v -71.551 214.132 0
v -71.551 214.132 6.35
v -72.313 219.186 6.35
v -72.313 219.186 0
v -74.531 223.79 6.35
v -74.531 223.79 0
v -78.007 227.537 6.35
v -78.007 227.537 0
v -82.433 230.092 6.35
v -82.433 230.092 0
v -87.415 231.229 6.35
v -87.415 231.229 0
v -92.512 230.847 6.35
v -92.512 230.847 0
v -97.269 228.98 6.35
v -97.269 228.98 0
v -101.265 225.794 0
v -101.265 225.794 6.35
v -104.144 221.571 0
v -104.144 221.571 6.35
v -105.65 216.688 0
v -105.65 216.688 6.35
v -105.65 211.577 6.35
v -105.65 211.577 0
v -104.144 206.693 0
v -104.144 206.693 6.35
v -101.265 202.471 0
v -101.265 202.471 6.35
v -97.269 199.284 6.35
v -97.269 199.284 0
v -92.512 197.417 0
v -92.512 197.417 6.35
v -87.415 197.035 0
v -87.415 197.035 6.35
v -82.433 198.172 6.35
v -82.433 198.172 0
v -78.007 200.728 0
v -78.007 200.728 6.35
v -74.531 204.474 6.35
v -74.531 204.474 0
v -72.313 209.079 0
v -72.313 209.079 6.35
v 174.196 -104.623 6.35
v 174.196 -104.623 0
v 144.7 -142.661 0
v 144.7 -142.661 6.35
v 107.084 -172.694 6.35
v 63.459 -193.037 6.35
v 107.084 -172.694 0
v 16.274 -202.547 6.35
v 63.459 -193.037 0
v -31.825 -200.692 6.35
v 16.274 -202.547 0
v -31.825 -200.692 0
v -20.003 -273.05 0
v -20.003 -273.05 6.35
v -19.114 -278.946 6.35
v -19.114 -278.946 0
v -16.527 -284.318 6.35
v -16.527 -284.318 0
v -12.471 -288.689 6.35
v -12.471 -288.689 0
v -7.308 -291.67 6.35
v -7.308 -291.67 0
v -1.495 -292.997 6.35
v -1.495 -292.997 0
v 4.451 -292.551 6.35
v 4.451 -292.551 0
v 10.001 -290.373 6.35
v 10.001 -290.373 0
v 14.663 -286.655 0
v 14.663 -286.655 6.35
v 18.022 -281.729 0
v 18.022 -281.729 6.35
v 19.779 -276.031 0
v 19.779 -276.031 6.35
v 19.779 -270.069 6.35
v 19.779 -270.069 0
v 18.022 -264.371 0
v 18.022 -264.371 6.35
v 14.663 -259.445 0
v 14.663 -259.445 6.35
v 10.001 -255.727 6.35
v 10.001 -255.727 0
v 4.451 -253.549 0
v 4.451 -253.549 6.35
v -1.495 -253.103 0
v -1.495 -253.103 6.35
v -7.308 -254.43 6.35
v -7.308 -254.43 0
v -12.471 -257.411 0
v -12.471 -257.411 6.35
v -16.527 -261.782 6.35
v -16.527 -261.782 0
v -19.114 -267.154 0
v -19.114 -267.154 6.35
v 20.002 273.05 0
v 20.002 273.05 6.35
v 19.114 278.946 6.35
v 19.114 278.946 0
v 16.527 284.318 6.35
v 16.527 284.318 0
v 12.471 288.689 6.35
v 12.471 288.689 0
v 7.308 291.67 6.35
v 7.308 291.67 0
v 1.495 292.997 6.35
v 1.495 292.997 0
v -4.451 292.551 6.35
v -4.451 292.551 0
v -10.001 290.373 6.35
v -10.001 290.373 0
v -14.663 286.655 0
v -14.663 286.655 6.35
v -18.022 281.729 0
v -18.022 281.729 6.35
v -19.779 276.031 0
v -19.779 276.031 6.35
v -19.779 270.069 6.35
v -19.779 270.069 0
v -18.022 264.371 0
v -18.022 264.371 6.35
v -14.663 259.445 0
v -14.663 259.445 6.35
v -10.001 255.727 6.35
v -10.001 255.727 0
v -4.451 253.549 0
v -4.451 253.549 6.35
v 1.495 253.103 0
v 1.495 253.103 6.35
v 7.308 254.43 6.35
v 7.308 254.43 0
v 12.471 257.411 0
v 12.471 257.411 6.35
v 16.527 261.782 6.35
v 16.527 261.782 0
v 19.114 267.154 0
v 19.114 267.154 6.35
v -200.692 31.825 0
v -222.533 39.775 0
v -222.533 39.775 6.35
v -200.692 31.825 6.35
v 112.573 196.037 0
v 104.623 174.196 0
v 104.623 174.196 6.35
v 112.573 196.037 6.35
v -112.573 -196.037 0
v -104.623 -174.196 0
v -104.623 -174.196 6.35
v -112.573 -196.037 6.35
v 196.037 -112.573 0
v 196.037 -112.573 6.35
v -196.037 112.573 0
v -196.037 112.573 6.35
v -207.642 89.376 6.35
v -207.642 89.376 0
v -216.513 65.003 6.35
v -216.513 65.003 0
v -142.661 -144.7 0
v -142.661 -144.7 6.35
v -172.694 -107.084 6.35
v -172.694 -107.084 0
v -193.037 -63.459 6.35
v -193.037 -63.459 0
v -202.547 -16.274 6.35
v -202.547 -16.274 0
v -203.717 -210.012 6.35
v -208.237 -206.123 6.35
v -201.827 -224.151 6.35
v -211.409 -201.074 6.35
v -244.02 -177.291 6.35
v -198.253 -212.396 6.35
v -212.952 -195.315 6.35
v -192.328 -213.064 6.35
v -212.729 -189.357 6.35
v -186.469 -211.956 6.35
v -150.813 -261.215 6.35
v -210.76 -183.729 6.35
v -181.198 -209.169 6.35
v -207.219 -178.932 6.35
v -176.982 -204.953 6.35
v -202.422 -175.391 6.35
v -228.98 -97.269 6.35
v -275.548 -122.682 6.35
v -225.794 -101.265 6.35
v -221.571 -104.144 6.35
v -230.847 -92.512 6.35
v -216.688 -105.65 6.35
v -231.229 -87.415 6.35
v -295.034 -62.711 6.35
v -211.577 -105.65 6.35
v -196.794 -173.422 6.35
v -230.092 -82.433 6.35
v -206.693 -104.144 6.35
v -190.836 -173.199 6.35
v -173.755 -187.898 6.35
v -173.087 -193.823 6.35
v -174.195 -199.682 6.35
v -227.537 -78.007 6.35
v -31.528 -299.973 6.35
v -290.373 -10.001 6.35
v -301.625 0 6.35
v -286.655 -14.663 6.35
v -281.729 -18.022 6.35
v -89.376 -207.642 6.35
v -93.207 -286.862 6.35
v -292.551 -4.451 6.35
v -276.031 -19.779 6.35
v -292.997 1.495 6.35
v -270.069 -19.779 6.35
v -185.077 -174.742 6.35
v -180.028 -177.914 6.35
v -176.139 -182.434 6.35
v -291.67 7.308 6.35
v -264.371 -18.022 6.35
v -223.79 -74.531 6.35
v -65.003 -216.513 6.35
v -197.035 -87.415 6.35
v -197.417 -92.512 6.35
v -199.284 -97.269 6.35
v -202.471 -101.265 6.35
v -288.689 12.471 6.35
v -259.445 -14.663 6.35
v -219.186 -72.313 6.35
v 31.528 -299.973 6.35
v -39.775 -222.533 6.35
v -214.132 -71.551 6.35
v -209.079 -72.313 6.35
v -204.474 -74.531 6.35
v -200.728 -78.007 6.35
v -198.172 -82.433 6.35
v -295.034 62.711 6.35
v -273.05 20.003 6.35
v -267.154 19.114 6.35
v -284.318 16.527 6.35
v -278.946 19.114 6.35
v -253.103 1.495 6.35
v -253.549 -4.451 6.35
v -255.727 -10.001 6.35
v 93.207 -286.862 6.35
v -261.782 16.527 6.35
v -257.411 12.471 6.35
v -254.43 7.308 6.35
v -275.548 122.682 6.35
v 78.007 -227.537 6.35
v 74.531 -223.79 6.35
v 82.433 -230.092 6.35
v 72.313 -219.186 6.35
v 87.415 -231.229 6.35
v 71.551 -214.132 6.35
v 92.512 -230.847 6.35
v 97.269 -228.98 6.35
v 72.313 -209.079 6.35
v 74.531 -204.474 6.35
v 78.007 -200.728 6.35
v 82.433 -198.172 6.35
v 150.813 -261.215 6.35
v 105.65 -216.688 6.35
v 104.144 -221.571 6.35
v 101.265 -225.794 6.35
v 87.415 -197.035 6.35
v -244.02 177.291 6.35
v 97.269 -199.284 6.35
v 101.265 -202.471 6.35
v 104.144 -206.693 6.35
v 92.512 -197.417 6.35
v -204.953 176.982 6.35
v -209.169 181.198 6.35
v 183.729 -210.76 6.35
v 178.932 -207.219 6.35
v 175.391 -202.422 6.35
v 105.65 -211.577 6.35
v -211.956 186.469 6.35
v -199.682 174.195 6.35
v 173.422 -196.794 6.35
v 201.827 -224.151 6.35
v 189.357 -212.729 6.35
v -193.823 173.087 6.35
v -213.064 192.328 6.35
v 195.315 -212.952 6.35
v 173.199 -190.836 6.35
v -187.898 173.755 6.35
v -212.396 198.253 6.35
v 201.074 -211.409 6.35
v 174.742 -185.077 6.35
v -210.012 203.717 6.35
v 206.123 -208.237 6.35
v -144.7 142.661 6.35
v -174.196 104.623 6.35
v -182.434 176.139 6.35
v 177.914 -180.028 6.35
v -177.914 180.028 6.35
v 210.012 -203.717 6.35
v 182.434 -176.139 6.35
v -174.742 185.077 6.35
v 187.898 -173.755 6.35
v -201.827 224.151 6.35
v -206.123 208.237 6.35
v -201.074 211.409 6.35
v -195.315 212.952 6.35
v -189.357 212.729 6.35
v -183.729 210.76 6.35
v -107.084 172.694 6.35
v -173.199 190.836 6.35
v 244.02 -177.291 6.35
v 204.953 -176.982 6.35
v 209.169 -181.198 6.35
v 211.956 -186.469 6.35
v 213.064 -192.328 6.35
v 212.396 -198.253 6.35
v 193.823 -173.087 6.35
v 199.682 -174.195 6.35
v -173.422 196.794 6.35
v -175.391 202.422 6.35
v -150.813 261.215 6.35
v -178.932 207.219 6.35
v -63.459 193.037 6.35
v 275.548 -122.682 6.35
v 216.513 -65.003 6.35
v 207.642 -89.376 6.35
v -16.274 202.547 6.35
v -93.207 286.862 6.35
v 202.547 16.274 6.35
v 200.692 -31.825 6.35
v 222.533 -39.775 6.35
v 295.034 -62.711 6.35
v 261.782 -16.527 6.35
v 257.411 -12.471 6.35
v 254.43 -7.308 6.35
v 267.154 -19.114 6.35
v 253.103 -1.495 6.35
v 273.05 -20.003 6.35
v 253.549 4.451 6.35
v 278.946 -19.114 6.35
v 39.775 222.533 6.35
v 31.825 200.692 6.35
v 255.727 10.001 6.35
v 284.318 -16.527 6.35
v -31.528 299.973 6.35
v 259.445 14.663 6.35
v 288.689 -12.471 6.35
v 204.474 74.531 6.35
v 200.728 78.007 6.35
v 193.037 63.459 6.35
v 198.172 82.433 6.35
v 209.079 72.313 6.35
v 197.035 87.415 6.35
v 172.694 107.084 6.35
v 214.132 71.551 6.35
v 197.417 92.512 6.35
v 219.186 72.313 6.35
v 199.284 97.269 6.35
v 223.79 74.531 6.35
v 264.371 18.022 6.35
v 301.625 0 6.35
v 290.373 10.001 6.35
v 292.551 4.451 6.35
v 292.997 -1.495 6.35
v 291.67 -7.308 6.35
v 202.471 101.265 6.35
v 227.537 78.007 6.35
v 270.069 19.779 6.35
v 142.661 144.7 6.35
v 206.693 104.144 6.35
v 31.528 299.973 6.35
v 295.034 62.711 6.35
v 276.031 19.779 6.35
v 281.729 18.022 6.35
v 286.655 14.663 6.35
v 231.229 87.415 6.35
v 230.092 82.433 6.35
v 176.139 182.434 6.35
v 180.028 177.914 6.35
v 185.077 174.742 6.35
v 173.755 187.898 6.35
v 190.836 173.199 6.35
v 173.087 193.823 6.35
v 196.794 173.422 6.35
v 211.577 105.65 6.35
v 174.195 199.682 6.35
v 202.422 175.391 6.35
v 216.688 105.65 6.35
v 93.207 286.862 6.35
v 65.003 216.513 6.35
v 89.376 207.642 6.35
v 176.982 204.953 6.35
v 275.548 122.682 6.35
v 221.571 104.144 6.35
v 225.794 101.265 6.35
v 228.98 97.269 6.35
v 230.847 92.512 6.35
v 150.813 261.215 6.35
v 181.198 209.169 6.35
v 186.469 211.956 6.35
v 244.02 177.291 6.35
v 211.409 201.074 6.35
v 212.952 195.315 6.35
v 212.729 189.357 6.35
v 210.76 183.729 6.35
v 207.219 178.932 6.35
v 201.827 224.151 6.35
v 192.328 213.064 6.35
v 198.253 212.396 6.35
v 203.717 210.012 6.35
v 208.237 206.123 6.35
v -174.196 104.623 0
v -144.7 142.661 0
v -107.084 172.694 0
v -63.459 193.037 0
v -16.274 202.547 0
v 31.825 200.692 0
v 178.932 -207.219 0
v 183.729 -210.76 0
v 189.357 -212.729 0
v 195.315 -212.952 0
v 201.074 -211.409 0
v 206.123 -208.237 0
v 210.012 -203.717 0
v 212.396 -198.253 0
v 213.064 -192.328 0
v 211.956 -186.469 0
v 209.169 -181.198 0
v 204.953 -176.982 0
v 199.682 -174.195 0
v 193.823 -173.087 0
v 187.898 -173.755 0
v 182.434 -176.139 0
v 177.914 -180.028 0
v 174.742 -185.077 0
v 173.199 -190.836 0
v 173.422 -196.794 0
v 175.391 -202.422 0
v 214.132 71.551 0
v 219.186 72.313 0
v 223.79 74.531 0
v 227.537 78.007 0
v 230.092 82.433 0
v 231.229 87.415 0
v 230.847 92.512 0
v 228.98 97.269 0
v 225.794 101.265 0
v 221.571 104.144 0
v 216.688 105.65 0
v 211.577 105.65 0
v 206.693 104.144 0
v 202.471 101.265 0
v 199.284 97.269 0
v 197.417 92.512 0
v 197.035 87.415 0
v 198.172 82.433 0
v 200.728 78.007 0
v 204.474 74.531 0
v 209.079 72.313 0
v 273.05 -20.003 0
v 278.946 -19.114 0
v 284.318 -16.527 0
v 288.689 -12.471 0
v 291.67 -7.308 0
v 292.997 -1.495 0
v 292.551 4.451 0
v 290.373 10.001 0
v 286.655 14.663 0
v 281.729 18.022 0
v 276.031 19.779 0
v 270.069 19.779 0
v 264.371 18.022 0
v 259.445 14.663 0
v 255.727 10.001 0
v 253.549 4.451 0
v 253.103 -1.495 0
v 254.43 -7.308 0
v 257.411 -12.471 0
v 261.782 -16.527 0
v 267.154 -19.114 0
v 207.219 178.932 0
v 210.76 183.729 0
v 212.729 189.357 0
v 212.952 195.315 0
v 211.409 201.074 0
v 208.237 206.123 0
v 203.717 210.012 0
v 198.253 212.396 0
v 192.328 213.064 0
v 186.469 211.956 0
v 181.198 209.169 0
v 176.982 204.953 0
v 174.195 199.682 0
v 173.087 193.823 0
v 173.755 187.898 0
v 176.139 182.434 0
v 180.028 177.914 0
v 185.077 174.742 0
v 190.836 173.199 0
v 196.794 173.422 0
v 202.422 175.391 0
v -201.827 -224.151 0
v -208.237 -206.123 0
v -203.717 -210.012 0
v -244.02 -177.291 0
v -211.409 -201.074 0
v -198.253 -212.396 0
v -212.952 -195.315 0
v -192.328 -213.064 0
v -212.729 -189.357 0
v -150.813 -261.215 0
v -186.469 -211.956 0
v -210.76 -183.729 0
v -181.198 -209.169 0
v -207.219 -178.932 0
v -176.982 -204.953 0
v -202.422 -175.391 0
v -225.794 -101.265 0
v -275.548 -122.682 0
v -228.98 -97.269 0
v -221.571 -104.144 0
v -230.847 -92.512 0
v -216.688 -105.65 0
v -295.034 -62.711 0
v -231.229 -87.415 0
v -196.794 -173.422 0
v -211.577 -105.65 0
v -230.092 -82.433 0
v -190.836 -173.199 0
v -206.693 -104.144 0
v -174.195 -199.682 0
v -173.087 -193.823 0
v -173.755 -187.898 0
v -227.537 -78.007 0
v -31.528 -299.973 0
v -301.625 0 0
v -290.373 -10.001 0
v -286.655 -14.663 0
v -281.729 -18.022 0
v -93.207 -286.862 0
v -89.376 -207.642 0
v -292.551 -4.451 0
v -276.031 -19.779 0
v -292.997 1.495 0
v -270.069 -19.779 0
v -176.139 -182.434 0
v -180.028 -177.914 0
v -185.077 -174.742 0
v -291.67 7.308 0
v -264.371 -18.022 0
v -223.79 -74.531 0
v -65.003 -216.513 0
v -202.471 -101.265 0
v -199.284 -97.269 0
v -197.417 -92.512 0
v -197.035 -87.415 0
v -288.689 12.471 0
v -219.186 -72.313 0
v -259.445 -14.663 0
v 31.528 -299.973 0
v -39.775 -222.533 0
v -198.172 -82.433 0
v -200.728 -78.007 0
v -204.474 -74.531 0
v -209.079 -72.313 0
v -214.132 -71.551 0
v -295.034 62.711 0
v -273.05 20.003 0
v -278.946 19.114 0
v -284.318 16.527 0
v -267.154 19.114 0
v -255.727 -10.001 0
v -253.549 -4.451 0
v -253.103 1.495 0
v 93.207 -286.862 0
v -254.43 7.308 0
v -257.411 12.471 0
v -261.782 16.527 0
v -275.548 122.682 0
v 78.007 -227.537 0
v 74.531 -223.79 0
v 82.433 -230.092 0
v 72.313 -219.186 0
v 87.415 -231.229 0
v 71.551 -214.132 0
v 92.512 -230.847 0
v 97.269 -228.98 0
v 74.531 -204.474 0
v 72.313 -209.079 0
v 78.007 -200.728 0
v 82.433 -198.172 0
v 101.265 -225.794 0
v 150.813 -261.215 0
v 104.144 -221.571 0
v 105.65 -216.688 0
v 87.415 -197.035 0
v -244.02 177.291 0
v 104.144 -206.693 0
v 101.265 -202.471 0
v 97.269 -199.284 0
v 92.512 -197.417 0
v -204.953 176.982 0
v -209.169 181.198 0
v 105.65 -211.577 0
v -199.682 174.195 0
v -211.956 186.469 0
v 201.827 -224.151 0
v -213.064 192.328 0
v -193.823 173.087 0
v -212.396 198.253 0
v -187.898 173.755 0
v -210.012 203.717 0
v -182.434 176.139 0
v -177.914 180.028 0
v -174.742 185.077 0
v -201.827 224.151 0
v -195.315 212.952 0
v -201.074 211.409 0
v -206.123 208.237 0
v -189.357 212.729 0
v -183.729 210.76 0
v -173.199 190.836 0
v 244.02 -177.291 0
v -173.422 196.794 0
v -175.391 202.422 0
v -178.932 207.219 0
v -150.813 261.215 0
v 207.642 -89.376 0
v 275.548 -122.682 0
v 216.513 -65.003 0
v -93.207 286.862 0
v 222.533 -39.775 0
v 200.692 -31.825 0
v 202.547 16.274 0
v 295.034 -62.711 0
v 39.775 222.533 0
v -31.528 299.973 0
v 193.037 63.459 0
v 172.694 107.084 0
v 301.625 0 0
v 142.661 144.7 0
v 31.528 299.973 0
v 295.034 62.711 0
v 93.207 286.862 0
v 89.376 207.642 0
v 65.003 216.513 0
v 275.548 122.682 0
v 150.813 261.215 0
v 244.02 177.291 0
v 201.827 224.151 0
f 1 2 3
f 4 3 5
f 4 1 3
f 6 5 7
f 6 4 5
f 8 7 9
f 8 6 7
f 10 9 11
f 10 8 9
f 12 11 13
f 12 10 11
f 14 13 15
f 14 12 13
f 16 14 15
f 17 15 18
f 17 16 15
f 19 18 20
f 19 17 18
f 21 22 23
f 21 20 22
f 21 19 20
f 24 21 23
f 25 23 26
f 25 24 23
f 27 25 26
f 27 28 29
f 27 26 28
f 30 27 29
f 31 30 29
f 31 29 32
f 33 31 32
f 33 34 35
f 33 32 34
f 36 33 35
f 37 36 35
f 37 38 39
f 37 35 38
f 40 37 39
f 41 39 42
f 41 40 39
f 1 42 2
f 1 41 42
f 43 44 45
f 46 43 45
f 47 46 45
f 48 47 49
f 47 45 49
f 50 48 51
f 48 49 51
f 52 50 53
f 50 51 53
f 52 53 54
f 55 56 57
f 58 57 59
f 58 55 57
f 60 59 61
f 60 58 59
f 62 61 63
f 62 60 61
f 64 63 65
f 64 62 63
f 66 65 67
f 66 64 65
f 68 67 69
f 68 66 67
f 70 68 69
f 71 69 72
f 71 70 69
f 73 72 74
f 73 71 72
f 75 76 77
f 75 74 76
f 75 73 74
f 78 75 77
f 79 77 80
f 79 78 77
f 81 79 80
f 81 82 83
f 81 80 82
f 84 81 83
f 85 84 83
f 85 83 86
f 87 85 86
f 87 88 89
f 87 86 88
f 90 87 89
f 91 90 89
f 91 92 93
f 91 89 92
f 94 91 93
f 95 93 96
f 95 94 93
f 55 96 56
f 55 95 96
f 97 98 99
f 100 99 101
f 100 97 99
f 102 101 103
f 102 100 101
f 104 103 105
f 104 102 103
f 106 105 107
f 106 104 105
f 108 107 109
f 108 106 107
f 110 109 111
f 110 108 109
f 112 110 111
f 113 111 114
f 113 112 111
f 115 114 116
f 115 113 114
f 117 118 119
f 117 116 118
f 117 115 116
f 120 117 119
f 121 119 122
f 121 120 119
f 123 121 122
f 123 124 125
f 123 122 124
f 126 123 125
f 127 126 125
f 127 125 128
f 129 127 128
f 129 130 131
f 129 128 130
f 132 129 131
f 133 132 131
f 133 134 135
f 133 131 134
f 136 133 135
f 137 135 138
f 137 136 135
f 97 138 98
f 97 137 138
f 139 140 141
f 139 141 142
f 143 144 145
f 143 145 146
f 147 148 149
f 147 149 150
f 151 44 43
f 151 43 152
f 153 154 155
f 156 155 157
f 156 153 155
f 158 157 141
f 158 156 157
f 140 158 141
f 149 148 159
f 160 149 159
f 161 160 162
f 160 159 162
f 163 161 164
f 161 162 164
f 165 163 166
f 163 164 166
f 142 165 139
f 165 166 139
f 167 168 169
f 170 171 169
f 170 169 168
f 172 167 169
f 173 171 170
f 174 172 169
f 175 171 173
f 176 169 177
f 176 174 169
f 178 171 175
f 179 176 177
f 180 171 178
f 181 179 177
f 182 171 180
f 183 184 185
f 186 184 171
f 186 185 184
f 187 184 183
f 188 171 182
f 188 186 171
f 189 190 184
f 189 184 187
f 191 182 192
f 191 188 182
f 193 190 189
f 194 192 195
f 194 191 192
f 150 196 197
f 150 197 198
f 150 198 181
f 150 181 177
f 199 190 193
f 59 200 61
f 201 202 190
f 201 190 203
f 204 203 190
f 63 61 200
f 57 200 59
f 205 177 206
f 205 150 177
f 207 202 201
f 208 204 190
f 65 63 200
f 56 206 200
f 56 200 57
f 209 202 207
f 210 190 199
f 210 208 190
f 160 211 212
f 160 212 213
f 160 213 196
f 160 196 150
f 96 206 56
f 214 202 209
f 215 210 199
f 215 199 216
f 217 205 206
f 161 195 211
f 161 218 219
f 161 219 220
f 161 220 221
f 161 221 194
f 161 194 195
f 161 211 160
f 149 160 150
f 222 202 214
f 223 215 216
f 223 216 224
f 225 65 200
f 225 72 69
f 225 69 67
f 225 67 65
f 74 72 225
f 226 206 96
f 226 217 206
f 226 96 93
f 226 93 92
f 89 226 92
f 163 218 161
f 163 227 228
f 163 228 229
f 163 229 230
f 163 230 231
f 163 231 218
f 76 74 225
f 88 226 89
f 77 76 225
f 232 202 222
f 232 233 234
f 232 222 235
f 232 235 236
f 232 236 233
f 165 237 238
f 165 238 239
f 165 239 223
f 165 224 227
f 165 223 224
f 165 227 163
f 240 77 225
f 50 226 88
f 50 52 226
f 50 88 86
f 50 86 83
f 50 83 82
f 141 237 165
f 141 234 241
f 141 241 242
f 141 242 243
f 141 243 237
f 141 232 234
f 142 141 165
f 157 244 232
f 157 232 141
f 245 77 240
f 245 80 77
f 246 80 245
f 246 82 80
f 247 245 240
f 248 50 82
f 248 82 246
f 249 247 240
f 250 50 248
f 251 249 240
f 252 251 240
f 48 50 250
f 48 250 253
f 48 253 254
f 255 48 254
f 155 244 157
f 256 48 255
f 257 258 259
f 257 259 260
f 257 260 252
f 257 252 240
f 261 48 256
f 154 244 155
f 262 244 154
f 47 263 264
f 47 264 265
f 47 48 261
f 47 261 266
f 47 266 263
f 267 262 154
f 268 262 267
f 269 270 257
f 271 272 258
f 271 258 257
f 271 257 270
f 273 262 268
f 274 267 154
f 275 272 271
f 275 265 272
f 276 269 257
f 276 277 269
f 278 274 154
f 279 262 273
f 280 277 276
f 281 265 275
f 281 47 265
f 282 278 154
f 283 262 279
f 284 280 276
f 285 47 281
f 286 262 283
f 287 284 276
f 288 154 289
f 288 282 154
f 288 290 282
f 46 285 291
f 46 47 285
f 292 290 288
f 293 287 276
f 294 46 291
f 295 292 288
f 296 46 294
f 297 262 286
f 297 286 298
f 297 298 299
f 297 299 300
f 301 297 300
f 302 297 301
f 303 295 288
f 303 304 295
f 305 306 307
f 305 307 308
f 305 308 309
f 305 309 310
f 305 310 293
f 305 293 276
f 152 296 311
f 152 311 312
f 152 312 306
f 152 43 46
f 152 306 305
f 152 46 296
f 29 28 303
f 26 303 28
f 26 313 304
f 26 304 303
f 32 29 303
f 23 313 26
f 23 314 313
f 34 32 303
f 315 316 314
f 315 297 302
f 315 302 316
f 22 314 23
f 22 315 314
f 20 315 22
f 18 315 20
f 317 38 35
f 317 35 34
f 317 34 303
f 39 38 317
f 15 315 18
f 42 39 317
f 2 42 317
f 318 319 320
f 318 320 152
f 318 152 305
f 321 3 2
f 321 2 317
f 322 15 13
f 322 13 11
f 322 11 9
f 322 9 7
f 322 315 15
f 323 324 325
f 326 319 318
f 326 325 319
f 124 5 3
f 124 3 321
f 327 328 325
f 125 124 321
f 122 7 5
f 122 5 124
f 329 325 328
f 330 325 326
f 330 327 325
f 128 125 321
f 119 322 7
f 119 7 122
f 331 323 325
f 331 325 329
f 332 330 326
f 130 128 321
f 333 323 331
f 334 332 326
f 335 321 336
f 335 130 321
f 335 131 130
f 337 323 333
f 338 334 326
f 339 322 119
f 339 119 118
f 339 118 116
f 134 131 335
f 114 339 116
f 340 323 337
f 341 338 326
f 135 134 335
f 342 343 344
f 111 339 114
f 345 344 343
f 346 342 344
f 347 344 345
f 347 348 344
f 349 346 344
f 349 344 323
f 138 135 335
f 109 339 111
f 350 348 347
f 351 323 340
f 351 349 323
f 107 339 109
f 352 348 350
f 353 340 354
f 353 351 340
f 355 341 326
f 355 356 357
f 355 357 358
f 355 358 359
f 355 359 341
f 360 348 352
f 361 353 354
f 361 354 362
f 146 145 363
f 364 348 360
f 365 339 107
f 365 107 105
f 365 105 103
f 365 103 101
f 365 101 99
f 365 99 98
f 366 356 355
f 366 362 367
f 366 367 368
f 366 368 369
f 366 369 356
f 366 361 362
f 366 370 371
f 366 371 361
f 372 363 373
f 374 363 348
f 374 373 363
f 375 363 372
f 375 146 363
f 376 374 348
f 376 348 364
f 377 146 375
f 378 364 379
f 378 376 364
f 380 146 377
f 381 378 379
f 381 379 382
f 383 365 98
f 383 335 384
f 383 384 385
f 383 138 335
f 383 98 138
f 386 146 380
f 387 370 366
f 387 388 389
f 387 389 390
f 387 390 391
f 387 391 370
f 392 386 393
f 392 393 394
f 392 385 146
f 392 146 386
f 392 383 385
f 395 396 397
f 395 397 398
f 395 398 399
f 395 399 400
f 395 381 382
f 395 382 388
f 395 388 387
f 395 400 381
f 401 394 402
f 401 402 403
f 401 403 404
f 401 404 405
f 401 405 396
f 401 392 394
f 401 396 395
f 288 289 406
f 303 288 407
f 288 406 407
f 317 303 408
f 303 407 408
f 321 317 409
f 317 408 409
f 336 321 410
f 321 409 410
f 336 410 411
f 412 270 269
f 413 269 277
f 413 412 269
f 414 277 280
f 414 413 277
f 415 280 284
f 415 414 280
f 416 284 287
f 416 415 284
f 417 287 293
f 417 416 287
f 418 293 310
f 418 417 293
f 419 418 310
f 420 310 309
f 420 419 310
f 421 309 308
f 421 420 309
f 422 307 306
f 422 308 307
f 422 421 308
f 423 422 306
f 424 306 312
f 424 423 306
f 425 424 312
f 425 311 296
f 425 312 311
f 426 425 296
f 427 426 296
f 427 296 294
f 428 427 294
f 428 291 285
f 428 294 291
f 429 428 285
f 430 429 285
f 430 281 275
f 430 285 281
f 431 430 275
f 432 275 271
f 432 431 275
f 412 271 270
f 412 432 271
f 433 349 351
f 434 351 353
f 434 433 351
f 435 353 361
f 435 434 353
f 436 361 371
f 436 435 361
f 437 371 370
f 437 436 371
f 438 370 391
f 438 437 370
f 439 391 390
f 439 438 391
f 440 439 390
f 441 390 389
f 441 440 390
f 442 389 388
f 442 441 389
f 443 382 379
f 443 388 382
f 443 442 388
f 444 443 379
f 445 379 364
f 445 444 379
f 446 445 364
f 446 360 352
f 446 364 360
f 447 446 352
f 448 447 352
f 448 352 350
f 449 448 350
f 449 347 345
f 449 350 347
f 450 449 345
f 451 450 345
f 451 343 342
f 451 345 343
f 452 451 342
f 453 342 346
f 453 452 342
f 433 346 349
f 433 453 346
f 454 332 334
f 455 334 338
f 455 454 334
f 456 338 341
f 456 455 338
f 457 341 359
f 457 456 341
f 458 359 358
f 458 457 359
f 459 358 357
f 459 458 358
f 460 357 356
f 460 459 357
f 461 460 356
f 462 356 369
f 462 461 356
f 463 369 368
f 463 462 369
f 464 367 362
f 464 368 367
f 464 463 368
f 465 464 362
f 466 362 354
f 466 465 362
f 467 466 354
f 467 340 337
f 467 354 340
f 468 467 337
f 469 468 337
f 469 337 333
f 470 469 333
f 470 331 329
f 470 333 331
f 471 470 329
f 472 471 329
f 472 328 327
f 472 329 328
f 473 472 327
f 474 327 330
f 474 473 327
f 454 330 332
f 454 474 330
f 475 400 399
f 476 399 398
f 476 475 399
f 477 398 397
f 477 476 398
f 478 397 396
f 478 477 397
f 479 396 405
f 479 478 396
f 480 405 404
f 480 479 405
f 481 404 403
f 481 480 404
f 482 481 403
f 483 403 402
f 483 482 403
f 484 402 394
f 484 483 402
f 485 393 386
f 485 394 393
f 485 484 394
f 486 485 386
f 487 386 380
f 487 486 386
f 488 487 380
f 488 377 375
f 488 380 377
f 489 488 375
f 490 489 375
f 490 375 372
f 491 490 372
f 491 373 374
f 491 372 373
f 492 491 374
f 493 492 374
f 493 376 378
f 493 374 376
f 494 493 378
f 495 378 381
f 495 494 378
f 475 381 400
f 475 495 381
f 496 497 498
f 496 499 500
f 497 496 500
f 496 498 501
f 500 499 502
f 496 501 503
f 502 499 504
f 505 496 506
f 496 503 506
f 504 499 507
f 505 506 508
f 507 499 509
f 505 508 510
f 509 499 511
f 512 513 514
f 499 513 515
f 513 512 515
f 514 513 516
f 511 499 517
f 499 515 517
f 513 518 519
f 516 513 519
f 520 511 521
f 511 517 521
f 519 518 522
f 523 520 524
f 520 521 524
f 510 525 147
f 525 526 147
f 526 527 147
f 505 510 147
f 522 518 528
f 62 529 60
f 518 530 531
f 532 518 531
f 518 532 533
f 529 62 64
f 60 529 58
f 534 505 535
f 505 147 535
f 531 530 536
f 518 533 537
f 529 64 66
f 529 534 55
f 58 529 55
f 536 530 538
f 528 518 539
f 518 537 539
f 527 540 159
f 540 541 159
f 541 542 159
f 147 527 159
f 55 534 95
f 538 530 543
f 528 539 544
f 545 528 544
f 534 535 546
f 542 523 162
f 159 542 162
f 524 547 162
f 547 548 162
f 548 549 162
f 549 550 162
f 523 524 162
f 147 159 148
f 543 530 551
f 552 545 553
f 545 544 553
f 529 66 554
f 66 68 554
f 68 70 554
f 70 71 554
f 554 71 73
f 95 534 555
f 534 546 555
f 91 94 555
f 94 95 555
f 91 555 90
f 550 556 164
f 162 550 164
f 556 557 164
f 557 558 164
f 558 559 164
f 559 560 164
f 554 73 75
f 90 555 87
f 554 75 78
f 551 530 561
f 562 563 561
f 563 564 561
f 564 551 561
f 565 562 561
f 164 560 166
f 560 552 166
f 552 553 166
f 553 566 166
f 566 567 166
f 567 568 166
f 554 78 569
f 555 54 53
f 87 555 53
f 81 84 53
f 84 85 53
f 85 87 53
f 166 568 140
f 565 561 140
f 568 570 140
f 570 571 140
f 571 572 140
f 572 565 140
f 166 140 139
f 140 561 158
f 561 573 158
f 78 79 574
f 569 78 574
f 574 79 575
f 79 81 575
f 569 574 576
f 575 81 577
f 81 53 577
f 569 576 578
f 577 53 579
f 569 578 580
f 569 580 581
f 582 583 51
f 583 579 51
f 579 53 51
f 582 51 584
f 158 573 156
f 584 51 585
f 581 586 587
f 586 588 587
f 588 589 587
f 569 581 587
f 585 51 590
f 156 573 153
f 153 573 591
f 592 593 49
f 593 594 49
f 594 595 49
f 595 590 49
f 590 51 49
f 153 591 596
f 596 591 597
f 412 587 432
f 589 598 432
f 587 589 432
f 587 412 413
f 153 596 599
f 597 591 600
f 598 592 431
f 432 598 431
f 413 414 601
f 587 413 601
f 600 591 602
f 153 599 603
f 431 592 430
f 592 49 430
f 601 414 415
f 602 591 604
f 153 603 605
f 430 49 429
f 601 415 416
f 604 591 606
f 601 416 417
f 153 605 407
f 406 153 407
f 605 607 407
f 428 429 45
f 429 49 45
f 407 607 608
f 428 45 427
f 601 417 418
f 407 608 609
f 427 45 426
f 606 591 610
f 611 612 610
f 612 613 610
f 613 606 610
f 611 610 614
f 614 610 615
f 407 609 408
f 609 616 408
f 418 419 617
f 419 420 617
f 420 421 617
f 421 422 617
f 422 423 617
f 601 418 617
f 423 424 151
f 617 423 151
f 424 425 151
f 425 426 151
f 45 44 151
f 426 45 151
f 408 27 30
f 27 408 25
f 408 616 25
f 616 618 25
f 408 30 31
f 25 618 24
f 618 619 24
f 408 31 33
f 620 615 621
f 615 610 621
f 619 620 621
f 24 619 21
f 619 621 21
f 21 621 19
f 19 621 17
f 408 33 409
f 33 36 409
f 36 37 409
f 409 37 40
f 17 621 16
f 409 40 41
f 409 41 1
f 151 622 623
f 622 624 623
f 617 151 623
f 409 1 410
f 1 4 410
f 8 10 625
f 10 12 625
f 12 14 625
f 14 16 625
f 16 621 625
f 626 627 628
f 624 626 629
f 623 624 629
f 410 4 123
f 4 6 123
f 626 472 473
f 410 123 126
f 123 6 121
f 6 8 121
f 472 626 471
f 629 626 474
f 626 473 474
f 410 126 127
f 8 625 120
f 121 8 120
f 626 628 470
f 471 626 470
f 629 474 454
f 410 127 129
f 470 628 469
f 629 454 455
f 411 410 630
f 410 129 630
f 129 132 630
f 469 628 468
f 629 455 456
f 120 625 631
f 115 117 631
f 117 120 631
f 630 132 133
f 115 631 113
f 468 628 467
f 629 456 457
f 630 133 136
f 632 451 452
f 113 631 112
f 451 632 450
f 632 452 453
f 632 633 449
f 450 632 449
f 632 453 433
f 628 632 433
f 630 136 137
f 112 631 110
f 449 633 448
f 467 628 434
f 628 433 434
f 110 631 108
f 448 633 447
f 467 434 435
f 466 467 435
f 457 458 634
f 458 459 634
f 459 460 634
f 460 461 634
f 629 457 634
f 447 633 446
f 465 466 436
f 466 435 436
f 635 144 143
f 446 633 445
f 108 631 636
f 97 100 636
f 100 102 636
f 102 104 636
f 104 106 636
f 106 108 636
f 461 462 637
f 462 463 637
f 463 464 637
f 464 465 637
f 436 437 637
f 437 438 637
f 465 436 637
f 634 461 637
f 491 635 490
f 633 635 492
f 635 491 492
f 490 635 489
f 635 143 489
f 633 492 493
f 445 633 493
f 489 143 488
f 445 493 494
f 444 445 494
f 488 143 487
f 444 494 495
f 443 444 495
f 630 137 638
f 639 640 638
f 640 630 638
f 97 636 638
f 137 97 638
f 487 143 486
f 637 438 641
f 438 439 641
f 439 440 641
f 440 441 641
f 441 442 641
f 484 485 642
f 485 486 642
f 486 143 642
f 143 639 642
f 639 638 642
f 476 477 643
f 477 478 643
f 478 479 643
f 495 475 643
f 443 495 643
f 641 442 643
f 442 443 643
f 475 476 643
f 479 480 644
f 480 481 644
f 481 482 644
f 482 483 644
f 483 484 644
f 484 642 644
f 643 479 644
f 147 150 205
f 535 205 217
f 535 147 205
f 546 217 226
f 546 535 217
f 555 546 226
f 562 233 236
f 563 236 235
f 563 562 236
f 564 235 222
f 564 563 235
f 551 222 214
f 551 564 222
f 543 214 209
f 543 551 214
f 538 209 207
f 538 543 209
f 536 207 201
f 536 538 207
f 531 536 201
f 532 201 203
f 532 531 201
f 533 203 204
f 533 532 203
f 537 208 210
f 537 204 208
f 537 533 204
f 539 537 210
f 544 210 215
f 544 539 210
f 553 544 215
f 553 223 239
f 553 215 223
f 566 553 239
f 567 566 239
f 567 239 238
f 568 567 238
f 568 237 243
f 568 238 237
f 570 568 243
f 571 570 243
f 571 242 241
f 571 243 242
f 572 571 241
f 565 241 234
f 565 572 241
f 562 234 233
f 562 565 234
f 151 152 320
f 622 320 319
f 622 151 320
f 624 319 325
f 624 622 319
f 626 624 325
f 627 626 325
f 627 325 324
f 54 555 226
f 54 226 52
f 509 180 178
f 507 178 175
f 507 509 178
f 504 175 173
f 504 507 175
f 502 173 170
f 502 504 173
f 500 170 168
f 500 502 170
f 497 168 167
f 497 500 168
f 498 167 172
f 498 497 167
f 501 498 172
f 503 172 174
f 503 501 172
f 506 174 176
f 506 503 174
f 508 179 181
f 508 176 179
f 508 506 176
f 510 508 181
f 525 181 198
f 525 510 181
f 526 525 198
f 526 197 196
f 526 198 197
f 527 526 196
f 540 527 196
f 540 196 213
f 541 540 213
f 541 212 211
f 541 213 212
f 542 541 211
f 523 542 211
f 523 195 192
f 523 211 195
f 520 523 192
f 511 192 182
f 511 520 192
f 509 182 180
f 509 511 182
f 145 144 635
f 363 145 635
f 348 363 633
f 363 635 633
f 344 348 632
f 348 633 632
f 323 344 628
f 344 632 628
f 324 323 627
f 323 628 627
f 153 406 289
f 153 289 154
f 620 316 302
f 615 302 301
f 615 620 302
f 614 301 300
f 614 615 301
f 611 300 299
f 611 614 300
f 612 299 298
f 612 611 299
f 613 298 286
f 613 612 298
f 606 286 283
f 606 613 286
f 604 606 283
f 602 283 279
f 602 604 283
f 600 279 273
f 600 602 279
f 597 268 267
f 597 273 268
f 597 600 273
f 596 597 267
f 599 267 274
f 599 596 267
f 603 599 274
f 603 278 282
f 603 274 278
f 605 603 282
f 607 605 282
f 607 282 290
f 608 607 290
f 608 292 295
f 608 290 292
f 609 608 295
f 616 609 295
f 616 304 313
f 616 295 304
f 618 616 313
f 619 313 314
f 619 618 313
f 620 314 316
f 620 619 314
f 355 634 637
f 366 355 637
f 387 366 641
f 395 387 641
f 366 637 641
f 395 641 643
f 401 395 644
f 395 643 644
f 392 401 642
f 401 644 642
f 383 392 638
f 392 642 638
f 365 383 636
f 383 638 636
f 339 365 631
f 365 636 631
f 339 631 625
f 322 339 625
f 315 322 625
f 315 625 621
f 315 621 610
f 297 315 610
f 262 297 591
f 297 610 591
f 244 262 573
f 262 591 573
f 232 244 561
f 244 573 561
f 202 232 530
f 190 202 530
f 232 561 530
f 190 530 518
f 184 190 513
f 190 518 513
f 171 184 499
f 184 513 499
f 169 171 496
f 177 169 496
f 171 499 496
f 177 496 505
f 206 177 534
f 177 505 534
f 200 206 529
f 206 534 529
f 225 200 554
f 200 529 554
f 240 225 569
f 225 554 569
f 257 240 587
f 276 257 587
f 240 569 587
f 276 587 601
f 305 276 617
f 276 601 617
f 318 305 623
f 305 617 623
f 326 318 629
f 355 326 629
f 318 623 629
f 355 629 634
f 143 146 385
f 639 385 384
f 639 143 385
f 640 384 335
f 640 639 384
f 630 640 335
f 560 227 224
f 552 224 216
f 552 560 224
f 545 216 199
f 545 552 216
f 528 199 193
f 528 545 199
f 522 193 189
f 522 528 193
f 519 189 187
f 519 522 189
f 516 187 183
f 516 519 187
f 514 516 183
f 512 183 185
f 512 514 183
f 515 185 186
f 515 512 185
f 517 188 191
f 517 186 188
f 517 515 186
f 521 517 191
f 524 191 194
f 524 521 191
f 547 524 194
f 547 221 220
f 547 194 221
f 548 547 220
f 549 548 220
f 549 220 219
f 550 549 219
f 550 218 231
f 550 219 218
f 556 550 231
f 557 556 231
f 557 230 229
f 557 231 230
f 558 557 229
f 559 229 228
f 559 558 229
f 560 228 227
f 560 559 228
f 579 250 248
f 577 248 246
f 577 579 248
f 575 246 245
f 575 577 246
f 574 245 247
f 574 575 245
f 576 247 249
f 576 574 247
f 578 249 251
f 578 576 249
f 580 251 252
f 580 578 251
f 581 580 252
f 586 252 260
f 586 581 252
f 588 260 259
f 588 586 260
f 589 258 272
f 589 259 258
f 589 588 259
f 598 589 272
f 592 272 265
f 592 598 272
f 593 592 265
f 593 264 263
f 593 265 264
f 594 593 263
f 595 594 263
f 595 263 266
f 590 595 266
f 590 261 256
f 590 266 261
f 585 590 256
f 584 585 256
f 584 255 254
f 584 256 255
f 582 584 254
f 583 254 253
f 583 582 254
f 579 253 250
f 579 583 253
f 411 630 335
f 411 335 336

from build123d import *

# Parameters (mm, degrees)
F0_R            = 301.625
F0_R_2          = 17.145
F0_R_3          = 20.0025
F1_DEPTH        = 6.35
F2_DEPTH        = 6.351
F2_COPIES_COUNT = 8
F3_DEPTH        = 6.351
F3_COPIES_COUNT = 4
F4_DEPTH        = 6.351
F4_COPIES_COUNT = 4


# Not quite as in the source:
# - a pattern or mirror of a feature is missing from the dataset's text; its kind, count and spacing are read off the source's solid


with BuildPart() as f1:
    # F0 (on Top) → F1 (new body)
    with BuildSketch(Plane.XY):
        Circle(F0_R)
        with Locations((-88.6964525364, 214.1321786478)):
            Circle(F0_R_2, mode=Mode.SUBTRACT)
        with BuildLine():
            ThreePointArc((104.6230881005, 174.1960086693), (176.846899184, 100.0770415679), (203.2, 0))
            ThreePointArc((203.2, 0), (-154.5268592771, -131.9533620714), (31.8251007682, 200.6923091728))
            Line((31.8251007682, 200.6923091728), (39.7746000853, 222.5333790425))
            ThreePointArc((39.7746000853, 222.5333790425), (77.3170736002, 212.4269138549), (112.5725874176, 196.037078539))
            Line((112.5725874176, 196.037078539), (104.6230881005, 174.1960086693))
        make_face(mode=Mode.SUBTRACT)
        with Locations((0, 273.05)):
            Circle(F0_R_3, mode=Mode.SUBTRACT)
        with BuildLine():
            ThreePointArc((31.8251007682, 200.6923091728), (69.4984931238, 190.9455405437), (104.6230881005, 174.1960086693))
            Line((104.6230881005, 174.1960086693), (112.5725874176, 196.037078539))
            ThreePointArc((112.5725874176, 196.037078539), (77.3170736002, 212.4269138549), (39.7746000853, 222.5333790425))
            Line((39.7746000853, 222.5333790425), (31.8251007682, 200.6923091728))
        make_face()
        with Locations((0, 273.05)):
            Circle(F0_R_3)
        with Locations((-88.6964525364, 214.1321786478)):
            Circle(F0_R_2)
    extrude(amount=F1_DEPTH)

    # F0 (on Top) → F2 (cut, through all)
    with BuildSketch(Plane.XY):
        with Locations((0, 273.05)):
            Circle(F0_R_3)
    f2 = extrude(amount=F2_DEPTH, mode=Mode.SUBTRACT)

    # F2_copies: F2 ×8 about axis
    f2_copies_axis = Axis((0, 0, 0), (0, 0, 1))
    for i in range(1, F2_COPIES_COUNT):
        add(f2.rotate(f2_copies_axis, i * 360 / F2_COPIES_COUNT), mode=Mode.SUBTRACT)

    # F0 (on Top) → F3 (cut, through all)
    with BuildSketch(Plane.XY):
        with BuildLine():
            ThreePointArc((31.8251007682, 200.6923091728), (69.4984931238, 190.9455405437), (104.6230881005, 174.1960086693))
            Line((104.6230881005, 174.1960086693), (112.5725874176, 196.037078539))
            ThreePointArc((112.5725874176, 196.037078539), (77.3170736002, 212.4269138549), (39.7746000853, 222.5333790425))
            Line((39.7746000853, 222.5333790425), (31.8251007682, 200.6923091728))
        make_face()
    f3 = extrude(amount=F3_DEPTH, mode=Mode.SUBTRACT)

    # F3_copies: F3 ×4 about axis
    f3_copies_axis = Axis((0, 0, 0), (0, 0, 1))
    for i in range(1, F3_COPIES_COUNT):
        add(f3.rotate(f3_copies_axis, i * 360 / F3_COPIES_COUNT), mode=Mode.SUBTRACT)

    # F0 (on Top) → F4 (cut, through all)
    with BuildSketch(Plane.XY):
        with Locations((-88.6964525364, 214.1321786478)):
            Circle(F0_R_2)
    f4 = extrude(amount=F4_DEPTH, mode=Mode.SUBTRACT)

    # F4_copies: F4 ×4 about axis
    f4_copies_axis = Axis((0, 0, 0), (0, 0, 1))
    for i in range(1, F4_COPIES_COUNT):
        add(f4.rotate(f4_copies_axis, i * 360 / F4_COPIES_COUNT), mode=Mode.SUBTRACT)


solid = f1.part
